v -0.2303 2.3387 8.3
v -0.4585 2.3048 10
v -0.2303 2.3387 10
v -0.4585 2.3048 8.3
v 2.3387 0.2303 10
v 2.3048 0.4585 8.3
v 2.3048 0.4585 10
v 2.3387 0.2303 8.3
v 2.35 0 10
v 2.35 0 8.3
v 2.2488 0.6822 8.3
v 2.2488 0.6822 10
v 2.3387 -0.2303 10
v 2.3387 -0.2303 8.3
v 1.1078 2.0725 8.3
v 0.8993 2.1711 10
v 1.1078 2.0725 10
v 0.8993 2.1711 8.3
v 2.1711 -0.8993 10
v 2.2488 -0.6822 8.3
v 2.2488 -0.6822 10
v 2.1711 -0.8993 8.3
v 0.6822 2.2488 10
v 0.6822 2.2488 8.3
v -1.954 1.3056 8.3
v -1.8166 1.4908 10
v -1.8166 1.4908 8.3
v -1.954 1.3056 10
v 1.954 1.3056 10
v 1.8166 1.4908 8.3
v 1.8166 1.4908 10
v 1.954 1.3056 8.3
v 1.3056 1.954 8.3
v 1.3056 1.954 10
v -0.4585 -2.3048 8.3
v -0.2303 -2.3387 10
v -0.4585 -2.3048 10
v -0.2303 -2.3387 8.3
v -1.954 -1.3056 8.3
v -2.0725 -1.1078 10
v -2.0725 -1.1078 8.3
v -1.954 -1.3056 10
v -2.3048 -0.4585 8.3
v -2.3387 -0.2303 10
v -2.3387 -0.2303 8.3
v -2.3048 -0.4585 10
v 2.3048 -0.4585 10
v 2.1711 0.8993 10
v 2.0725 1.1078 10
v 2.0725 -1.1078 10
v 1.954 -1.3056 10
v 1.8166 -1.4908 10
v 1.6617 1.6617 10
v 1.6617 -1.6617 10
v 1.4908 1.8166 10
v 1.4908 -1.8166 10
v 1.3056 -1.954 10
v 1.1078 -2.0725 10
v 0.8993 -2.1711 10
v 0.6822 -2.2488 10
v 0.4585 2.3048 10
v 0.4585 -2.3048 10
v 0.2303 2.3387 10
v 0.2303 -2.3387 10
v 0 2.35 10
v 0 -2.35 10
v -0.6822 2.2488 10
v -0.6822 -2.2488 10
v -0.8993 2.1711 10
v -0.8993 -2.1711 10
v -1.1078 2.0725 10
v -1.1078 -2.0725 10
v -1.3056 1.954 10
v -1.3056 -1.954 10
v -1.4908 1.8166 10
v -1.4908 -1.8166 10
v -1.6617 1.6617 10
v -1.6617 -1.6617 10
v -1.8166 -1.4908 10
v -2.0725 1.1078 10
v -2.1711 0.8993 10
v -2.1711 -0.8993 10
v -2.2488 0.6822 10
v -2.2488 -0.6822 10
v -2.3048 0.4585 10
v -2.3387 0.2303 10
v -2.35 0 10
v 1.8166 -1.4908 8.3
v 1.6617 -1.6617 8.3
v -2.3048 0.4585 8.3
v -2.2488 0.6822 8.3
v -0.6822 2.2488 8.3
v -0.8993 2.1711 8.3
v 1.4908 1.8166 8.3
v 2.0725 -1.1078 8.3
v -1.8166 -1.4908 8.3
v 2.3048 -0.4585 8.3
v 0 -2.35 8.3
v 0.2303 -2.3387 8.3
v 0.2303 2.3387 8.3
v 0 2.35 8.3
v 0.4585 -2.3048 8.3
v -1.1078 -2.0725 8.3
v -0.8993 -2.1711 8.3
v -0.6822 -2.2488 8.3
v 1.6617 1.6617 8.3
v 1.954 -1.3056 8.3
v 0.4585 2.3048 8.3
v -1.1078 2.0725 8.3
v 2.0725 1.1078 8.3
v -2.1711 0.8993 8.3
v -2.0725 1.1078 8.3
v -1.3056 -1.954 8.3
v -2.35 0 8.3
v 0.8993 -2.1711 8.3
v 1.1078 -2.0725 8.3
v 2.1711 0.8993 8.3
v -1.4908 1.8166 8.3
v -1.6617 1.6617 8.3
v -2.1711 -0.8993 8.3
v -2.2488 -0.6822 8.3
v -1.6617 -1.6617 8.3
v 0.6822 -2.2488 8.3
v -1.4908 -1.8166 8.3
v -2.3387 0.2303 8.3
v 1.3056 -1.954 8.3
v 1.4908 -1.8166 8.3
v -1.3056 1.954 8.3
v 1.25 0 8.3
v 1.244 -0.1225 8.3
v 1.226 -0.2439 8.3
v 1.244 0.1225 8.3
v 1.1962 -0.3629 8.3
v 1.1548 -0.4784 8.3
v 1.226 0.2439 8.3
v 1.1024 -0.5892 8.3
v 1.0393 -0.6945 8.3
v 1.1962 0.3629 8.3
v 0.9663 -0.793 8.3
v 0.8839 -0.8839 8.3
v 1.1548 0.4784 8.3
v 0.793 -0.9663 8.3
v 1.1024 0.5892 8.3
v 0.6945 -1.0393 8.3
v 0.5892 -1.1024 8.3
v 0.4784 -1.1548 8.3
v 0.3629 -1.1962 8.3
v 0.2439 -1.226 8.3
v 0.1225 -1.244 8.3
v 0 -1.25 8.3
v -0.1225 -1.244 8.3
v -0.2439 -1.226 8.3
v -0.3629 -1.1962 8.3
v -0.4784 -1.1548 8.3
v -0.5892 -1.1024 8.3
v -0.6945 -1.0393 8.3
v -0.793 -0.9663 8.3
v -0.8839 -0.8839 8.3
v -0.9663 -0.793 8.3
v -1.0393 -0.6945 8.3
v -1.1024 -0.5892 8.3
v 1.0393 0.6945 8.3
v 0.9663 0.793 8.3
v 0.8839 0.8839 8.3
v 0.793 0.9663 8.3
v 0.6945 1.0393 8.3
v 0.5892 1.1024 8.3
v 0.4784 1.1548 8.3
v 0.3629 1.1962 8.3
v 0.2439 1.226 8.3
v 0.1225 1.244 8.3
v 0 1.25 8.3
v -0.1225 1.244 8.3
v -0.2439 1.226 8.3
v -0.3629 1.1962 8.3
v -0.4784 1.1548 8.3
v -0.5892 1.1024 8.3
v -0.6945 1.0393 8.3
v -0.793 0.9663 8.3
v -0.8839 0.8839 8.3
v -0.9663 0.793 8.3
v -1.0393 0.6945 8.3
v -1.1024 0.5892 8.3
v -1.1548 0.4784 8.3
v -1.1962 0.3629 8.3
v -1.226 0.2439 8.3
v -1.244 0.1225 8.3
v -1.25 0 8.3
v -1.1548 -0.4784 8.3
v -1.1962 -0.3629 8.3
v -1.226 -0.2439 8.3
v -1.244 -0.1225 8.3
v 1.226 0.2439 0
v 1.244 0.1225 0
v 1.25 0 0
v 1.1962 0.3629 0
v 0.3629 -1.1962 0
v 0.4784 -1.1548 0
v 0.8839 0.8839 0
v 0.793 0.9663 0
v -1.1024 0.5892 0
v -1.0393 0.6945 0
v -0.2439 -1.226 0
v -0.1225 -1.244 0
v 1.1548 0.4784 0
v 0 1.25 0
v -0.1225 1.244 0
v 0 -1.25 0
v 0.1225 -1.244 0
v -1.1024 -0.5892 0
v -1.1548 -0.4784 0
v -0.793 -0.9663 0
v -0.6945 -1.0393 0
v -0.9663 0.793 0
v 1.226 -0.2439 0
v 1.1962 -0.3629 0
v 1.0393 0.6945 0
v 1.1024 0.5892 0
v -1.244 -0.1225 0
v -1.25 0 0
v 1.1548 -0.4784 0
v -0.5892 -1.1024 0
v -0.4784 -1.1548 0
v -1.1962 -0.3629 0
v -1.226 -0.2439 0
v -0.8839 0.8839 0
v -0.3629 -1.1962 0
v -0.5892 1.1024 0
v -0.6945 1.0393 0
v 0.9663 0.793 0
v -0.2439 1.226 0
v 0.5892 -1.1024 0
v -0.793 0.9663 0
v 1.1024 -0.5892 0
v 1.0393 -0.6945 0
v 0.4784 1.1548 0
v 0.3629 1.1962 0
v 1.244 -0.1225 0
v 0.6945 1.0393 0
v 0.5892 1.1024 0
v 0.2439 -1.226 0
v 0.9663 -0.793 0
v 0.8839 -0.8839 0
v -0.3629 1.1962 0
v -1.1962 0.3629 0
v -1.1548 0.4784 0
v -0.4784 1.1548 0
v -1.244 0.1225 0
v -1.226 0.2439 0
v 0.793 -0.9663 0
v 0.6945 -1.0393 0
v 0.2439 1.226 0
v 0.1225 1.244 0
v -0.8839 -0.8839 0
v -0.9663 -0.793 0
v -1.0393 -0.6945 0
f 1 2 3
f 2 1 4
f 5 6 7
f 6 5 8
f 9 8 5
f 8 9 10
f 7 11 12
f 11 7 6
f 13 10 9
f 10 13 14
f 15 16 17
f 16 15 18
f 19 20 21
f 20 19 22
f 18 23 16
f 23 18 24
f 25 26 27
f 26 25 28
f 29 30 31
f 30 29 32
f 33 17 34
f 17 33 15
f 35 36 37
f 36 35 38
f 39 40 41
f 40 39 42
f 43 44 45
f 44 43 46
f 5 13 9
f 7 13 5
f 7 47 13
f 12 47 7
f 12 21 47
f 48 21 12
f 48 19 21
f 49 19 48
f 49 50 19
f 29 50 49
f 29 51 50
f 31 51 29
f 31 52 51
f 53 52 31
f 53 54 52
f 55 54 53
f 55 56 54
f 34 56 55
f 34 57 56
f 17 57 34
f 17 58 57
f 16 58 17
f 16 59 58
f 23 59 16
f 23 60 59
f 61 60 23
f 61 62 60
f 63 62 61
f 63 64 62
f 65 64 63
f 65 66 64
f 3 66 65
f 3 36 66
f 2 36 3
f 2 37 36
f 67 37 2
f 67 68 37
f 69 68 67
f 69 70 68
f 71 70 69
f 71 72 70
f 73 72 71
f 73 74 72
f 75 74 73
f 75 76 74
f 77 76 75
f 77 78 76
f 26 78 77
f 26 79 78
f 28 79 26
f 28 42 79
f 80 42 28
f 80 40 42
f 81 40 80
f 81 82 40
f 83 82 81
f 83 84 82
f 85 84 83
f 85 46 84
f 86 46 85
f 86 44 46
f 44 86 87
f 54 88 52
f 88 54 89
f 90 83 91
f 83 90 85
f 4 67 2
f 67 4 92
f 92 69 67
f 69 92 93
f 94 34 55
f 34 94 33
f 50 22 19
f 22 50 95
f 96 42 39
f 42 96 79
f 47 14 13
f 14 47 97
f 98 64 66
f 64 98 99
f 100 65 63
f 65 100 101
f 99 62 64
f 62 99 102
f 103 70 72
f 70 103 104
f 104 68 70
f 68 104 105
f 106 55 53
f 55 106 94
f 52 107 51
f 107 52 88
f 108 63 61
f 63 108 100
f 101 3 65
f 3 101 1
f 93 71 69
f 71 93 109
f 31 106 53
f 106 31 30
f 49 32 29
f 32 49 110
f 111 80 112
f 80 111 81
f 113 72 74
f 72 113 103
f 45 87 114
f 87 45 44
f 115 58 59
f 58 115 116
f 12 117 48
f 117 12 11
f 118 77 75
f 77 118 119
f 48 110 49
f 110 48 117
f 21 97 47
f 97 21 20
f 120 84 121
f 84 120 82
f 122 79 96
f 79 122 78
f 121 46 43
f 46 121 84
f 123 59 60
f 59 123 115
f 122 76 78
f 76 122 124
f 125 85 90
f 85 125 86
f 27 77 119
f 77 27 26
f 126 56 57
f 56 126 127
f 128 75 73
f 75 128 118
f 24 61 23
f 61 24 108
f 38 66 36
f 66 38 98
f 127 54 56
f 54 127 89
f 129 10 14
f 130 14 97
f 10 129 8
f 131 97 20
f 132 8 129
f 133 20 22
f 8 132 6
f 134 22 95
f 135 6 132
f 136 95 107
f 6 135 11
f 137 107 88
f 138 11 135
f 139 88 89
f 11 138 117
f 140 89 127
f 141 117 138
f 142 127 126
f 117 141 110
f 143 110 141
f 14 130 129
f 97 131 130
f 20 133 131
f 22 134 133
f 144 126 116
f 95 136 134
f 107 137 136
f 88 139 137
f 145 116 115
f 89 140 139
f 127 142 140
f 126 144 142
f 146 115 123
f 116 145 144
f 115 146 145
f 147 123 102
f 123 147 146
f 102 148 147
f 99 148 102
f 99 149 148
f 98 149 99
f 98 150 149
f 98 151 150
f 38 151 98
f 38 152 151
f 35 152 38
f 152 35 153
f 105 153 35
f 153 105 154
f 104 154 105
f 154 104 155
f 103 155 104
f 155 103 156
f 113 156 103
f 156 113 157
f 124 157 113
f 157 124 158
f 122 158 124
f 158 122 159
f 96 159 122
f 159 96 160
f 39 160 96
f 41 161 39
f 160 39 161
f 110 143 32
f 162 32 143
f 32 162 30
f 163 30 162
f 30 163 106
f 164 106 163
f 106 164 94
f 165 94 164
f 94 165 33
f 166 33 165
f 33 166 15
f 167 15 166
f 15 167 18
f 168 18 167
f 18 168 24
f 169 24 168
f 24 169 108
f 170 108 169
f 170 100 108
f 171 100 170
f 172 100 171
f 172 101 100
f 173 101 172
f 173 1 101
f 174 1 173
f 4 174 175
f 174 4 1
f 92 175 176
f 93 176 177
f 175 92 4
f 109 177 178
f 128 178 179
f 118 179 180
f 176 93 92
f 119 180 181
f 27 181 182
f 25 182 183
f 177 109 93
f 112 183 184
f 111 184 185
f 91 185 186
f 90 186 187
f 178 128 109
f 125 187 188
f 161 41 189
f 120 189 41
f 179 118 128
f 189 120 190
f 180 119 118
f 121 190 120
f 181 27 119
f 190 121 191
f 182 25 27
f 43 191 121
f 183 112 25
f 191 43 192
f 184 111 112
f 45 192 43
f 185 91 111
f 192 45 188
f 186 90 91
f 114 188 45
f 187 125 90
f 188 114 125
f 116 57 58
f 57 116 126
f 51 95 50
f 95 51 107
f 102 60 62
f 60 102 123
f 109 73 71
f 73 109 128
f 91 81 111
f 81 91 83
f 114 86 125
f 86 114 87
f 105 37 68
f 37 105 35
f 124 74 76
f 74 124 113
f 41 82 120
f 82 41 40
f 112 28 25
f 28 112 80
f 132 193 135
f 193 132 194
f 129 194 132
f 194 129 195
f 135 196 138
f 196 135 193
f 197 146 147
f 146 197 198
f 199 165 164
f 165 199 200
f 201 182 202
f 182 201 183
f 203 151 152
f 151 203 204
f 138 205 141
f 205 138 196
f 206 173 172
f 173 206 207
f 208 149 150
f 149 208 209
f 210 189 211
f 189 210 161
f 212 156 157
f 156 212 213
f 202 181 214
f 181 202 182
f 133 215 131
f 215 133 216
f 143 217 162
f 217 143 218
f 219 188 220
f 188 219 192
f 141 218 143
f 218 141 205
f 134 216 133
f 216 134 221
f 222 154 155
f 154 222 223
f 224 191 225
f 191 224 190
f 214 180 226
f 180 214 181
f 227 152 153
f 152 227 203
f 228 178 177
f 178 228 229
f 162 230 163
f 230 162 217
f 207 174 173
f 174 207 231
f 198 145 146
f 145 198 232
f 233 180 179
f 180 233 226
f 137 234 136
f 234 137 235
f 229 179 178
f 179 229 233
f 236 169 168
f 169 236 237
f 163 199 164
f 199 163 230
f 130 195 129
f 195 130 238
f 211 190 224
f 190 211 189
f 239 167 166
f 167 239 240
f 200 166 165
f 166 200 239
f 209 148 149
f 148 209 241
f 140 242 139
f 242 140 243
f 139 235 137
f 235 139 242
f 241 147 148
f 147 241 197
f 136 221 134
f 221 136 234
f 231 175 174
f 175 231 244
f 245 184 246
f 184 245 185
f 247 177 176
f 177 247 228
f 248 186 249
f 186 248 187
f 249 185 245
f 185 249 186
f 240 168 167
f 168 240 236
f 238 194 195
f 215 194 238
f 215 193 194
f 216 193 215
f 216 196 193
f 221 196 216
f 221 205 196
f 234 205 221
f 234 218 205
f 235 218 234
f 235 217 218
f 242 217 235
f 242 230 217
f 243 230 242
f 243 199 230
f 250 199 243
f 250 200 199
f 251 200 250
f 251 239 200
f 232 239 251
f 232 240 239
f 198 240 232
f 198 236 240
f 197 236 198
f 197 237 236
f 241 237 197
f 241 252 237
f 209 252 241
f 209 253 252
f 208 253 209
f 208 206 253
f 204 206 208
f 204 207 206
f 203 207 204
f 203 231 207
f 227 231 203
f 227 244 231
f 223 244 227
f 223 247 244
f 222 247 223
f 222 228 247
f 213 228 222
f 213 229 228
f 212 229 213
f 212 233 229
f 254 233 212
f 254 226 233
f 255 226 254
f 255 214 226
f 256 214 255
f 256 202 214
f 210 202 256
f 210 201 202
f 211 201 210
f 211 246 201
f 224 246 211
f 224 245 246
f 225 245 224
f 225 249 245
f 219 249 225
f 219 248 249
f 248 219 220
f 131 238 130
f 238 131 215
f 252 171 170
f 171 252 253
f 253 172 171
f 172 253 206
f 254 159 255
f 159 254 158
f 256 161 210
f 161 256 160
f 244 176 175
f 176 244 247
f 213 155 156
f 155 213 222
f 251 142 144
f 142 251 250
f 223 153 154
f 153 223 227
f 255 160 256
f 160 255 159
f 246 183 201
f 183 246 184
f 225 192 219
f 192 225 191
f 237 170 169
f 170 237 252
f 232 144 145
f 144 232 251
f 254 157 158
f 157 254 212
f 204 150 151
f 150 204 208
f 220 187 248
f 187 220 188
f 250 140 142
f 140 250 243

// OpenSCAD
module pan_head_screw() {
    union() {
        // Screw head
        translate([0, 0, 10 - 1.7])
            cylinder(h = 1.7, d = 4.7, $fn = 64);
        
        // Screw shaft
        translate([0, 0, 0])
            cylinder(h = 10, d = 2.5, $fn = 64);
    }
}

pan_head_screw();
